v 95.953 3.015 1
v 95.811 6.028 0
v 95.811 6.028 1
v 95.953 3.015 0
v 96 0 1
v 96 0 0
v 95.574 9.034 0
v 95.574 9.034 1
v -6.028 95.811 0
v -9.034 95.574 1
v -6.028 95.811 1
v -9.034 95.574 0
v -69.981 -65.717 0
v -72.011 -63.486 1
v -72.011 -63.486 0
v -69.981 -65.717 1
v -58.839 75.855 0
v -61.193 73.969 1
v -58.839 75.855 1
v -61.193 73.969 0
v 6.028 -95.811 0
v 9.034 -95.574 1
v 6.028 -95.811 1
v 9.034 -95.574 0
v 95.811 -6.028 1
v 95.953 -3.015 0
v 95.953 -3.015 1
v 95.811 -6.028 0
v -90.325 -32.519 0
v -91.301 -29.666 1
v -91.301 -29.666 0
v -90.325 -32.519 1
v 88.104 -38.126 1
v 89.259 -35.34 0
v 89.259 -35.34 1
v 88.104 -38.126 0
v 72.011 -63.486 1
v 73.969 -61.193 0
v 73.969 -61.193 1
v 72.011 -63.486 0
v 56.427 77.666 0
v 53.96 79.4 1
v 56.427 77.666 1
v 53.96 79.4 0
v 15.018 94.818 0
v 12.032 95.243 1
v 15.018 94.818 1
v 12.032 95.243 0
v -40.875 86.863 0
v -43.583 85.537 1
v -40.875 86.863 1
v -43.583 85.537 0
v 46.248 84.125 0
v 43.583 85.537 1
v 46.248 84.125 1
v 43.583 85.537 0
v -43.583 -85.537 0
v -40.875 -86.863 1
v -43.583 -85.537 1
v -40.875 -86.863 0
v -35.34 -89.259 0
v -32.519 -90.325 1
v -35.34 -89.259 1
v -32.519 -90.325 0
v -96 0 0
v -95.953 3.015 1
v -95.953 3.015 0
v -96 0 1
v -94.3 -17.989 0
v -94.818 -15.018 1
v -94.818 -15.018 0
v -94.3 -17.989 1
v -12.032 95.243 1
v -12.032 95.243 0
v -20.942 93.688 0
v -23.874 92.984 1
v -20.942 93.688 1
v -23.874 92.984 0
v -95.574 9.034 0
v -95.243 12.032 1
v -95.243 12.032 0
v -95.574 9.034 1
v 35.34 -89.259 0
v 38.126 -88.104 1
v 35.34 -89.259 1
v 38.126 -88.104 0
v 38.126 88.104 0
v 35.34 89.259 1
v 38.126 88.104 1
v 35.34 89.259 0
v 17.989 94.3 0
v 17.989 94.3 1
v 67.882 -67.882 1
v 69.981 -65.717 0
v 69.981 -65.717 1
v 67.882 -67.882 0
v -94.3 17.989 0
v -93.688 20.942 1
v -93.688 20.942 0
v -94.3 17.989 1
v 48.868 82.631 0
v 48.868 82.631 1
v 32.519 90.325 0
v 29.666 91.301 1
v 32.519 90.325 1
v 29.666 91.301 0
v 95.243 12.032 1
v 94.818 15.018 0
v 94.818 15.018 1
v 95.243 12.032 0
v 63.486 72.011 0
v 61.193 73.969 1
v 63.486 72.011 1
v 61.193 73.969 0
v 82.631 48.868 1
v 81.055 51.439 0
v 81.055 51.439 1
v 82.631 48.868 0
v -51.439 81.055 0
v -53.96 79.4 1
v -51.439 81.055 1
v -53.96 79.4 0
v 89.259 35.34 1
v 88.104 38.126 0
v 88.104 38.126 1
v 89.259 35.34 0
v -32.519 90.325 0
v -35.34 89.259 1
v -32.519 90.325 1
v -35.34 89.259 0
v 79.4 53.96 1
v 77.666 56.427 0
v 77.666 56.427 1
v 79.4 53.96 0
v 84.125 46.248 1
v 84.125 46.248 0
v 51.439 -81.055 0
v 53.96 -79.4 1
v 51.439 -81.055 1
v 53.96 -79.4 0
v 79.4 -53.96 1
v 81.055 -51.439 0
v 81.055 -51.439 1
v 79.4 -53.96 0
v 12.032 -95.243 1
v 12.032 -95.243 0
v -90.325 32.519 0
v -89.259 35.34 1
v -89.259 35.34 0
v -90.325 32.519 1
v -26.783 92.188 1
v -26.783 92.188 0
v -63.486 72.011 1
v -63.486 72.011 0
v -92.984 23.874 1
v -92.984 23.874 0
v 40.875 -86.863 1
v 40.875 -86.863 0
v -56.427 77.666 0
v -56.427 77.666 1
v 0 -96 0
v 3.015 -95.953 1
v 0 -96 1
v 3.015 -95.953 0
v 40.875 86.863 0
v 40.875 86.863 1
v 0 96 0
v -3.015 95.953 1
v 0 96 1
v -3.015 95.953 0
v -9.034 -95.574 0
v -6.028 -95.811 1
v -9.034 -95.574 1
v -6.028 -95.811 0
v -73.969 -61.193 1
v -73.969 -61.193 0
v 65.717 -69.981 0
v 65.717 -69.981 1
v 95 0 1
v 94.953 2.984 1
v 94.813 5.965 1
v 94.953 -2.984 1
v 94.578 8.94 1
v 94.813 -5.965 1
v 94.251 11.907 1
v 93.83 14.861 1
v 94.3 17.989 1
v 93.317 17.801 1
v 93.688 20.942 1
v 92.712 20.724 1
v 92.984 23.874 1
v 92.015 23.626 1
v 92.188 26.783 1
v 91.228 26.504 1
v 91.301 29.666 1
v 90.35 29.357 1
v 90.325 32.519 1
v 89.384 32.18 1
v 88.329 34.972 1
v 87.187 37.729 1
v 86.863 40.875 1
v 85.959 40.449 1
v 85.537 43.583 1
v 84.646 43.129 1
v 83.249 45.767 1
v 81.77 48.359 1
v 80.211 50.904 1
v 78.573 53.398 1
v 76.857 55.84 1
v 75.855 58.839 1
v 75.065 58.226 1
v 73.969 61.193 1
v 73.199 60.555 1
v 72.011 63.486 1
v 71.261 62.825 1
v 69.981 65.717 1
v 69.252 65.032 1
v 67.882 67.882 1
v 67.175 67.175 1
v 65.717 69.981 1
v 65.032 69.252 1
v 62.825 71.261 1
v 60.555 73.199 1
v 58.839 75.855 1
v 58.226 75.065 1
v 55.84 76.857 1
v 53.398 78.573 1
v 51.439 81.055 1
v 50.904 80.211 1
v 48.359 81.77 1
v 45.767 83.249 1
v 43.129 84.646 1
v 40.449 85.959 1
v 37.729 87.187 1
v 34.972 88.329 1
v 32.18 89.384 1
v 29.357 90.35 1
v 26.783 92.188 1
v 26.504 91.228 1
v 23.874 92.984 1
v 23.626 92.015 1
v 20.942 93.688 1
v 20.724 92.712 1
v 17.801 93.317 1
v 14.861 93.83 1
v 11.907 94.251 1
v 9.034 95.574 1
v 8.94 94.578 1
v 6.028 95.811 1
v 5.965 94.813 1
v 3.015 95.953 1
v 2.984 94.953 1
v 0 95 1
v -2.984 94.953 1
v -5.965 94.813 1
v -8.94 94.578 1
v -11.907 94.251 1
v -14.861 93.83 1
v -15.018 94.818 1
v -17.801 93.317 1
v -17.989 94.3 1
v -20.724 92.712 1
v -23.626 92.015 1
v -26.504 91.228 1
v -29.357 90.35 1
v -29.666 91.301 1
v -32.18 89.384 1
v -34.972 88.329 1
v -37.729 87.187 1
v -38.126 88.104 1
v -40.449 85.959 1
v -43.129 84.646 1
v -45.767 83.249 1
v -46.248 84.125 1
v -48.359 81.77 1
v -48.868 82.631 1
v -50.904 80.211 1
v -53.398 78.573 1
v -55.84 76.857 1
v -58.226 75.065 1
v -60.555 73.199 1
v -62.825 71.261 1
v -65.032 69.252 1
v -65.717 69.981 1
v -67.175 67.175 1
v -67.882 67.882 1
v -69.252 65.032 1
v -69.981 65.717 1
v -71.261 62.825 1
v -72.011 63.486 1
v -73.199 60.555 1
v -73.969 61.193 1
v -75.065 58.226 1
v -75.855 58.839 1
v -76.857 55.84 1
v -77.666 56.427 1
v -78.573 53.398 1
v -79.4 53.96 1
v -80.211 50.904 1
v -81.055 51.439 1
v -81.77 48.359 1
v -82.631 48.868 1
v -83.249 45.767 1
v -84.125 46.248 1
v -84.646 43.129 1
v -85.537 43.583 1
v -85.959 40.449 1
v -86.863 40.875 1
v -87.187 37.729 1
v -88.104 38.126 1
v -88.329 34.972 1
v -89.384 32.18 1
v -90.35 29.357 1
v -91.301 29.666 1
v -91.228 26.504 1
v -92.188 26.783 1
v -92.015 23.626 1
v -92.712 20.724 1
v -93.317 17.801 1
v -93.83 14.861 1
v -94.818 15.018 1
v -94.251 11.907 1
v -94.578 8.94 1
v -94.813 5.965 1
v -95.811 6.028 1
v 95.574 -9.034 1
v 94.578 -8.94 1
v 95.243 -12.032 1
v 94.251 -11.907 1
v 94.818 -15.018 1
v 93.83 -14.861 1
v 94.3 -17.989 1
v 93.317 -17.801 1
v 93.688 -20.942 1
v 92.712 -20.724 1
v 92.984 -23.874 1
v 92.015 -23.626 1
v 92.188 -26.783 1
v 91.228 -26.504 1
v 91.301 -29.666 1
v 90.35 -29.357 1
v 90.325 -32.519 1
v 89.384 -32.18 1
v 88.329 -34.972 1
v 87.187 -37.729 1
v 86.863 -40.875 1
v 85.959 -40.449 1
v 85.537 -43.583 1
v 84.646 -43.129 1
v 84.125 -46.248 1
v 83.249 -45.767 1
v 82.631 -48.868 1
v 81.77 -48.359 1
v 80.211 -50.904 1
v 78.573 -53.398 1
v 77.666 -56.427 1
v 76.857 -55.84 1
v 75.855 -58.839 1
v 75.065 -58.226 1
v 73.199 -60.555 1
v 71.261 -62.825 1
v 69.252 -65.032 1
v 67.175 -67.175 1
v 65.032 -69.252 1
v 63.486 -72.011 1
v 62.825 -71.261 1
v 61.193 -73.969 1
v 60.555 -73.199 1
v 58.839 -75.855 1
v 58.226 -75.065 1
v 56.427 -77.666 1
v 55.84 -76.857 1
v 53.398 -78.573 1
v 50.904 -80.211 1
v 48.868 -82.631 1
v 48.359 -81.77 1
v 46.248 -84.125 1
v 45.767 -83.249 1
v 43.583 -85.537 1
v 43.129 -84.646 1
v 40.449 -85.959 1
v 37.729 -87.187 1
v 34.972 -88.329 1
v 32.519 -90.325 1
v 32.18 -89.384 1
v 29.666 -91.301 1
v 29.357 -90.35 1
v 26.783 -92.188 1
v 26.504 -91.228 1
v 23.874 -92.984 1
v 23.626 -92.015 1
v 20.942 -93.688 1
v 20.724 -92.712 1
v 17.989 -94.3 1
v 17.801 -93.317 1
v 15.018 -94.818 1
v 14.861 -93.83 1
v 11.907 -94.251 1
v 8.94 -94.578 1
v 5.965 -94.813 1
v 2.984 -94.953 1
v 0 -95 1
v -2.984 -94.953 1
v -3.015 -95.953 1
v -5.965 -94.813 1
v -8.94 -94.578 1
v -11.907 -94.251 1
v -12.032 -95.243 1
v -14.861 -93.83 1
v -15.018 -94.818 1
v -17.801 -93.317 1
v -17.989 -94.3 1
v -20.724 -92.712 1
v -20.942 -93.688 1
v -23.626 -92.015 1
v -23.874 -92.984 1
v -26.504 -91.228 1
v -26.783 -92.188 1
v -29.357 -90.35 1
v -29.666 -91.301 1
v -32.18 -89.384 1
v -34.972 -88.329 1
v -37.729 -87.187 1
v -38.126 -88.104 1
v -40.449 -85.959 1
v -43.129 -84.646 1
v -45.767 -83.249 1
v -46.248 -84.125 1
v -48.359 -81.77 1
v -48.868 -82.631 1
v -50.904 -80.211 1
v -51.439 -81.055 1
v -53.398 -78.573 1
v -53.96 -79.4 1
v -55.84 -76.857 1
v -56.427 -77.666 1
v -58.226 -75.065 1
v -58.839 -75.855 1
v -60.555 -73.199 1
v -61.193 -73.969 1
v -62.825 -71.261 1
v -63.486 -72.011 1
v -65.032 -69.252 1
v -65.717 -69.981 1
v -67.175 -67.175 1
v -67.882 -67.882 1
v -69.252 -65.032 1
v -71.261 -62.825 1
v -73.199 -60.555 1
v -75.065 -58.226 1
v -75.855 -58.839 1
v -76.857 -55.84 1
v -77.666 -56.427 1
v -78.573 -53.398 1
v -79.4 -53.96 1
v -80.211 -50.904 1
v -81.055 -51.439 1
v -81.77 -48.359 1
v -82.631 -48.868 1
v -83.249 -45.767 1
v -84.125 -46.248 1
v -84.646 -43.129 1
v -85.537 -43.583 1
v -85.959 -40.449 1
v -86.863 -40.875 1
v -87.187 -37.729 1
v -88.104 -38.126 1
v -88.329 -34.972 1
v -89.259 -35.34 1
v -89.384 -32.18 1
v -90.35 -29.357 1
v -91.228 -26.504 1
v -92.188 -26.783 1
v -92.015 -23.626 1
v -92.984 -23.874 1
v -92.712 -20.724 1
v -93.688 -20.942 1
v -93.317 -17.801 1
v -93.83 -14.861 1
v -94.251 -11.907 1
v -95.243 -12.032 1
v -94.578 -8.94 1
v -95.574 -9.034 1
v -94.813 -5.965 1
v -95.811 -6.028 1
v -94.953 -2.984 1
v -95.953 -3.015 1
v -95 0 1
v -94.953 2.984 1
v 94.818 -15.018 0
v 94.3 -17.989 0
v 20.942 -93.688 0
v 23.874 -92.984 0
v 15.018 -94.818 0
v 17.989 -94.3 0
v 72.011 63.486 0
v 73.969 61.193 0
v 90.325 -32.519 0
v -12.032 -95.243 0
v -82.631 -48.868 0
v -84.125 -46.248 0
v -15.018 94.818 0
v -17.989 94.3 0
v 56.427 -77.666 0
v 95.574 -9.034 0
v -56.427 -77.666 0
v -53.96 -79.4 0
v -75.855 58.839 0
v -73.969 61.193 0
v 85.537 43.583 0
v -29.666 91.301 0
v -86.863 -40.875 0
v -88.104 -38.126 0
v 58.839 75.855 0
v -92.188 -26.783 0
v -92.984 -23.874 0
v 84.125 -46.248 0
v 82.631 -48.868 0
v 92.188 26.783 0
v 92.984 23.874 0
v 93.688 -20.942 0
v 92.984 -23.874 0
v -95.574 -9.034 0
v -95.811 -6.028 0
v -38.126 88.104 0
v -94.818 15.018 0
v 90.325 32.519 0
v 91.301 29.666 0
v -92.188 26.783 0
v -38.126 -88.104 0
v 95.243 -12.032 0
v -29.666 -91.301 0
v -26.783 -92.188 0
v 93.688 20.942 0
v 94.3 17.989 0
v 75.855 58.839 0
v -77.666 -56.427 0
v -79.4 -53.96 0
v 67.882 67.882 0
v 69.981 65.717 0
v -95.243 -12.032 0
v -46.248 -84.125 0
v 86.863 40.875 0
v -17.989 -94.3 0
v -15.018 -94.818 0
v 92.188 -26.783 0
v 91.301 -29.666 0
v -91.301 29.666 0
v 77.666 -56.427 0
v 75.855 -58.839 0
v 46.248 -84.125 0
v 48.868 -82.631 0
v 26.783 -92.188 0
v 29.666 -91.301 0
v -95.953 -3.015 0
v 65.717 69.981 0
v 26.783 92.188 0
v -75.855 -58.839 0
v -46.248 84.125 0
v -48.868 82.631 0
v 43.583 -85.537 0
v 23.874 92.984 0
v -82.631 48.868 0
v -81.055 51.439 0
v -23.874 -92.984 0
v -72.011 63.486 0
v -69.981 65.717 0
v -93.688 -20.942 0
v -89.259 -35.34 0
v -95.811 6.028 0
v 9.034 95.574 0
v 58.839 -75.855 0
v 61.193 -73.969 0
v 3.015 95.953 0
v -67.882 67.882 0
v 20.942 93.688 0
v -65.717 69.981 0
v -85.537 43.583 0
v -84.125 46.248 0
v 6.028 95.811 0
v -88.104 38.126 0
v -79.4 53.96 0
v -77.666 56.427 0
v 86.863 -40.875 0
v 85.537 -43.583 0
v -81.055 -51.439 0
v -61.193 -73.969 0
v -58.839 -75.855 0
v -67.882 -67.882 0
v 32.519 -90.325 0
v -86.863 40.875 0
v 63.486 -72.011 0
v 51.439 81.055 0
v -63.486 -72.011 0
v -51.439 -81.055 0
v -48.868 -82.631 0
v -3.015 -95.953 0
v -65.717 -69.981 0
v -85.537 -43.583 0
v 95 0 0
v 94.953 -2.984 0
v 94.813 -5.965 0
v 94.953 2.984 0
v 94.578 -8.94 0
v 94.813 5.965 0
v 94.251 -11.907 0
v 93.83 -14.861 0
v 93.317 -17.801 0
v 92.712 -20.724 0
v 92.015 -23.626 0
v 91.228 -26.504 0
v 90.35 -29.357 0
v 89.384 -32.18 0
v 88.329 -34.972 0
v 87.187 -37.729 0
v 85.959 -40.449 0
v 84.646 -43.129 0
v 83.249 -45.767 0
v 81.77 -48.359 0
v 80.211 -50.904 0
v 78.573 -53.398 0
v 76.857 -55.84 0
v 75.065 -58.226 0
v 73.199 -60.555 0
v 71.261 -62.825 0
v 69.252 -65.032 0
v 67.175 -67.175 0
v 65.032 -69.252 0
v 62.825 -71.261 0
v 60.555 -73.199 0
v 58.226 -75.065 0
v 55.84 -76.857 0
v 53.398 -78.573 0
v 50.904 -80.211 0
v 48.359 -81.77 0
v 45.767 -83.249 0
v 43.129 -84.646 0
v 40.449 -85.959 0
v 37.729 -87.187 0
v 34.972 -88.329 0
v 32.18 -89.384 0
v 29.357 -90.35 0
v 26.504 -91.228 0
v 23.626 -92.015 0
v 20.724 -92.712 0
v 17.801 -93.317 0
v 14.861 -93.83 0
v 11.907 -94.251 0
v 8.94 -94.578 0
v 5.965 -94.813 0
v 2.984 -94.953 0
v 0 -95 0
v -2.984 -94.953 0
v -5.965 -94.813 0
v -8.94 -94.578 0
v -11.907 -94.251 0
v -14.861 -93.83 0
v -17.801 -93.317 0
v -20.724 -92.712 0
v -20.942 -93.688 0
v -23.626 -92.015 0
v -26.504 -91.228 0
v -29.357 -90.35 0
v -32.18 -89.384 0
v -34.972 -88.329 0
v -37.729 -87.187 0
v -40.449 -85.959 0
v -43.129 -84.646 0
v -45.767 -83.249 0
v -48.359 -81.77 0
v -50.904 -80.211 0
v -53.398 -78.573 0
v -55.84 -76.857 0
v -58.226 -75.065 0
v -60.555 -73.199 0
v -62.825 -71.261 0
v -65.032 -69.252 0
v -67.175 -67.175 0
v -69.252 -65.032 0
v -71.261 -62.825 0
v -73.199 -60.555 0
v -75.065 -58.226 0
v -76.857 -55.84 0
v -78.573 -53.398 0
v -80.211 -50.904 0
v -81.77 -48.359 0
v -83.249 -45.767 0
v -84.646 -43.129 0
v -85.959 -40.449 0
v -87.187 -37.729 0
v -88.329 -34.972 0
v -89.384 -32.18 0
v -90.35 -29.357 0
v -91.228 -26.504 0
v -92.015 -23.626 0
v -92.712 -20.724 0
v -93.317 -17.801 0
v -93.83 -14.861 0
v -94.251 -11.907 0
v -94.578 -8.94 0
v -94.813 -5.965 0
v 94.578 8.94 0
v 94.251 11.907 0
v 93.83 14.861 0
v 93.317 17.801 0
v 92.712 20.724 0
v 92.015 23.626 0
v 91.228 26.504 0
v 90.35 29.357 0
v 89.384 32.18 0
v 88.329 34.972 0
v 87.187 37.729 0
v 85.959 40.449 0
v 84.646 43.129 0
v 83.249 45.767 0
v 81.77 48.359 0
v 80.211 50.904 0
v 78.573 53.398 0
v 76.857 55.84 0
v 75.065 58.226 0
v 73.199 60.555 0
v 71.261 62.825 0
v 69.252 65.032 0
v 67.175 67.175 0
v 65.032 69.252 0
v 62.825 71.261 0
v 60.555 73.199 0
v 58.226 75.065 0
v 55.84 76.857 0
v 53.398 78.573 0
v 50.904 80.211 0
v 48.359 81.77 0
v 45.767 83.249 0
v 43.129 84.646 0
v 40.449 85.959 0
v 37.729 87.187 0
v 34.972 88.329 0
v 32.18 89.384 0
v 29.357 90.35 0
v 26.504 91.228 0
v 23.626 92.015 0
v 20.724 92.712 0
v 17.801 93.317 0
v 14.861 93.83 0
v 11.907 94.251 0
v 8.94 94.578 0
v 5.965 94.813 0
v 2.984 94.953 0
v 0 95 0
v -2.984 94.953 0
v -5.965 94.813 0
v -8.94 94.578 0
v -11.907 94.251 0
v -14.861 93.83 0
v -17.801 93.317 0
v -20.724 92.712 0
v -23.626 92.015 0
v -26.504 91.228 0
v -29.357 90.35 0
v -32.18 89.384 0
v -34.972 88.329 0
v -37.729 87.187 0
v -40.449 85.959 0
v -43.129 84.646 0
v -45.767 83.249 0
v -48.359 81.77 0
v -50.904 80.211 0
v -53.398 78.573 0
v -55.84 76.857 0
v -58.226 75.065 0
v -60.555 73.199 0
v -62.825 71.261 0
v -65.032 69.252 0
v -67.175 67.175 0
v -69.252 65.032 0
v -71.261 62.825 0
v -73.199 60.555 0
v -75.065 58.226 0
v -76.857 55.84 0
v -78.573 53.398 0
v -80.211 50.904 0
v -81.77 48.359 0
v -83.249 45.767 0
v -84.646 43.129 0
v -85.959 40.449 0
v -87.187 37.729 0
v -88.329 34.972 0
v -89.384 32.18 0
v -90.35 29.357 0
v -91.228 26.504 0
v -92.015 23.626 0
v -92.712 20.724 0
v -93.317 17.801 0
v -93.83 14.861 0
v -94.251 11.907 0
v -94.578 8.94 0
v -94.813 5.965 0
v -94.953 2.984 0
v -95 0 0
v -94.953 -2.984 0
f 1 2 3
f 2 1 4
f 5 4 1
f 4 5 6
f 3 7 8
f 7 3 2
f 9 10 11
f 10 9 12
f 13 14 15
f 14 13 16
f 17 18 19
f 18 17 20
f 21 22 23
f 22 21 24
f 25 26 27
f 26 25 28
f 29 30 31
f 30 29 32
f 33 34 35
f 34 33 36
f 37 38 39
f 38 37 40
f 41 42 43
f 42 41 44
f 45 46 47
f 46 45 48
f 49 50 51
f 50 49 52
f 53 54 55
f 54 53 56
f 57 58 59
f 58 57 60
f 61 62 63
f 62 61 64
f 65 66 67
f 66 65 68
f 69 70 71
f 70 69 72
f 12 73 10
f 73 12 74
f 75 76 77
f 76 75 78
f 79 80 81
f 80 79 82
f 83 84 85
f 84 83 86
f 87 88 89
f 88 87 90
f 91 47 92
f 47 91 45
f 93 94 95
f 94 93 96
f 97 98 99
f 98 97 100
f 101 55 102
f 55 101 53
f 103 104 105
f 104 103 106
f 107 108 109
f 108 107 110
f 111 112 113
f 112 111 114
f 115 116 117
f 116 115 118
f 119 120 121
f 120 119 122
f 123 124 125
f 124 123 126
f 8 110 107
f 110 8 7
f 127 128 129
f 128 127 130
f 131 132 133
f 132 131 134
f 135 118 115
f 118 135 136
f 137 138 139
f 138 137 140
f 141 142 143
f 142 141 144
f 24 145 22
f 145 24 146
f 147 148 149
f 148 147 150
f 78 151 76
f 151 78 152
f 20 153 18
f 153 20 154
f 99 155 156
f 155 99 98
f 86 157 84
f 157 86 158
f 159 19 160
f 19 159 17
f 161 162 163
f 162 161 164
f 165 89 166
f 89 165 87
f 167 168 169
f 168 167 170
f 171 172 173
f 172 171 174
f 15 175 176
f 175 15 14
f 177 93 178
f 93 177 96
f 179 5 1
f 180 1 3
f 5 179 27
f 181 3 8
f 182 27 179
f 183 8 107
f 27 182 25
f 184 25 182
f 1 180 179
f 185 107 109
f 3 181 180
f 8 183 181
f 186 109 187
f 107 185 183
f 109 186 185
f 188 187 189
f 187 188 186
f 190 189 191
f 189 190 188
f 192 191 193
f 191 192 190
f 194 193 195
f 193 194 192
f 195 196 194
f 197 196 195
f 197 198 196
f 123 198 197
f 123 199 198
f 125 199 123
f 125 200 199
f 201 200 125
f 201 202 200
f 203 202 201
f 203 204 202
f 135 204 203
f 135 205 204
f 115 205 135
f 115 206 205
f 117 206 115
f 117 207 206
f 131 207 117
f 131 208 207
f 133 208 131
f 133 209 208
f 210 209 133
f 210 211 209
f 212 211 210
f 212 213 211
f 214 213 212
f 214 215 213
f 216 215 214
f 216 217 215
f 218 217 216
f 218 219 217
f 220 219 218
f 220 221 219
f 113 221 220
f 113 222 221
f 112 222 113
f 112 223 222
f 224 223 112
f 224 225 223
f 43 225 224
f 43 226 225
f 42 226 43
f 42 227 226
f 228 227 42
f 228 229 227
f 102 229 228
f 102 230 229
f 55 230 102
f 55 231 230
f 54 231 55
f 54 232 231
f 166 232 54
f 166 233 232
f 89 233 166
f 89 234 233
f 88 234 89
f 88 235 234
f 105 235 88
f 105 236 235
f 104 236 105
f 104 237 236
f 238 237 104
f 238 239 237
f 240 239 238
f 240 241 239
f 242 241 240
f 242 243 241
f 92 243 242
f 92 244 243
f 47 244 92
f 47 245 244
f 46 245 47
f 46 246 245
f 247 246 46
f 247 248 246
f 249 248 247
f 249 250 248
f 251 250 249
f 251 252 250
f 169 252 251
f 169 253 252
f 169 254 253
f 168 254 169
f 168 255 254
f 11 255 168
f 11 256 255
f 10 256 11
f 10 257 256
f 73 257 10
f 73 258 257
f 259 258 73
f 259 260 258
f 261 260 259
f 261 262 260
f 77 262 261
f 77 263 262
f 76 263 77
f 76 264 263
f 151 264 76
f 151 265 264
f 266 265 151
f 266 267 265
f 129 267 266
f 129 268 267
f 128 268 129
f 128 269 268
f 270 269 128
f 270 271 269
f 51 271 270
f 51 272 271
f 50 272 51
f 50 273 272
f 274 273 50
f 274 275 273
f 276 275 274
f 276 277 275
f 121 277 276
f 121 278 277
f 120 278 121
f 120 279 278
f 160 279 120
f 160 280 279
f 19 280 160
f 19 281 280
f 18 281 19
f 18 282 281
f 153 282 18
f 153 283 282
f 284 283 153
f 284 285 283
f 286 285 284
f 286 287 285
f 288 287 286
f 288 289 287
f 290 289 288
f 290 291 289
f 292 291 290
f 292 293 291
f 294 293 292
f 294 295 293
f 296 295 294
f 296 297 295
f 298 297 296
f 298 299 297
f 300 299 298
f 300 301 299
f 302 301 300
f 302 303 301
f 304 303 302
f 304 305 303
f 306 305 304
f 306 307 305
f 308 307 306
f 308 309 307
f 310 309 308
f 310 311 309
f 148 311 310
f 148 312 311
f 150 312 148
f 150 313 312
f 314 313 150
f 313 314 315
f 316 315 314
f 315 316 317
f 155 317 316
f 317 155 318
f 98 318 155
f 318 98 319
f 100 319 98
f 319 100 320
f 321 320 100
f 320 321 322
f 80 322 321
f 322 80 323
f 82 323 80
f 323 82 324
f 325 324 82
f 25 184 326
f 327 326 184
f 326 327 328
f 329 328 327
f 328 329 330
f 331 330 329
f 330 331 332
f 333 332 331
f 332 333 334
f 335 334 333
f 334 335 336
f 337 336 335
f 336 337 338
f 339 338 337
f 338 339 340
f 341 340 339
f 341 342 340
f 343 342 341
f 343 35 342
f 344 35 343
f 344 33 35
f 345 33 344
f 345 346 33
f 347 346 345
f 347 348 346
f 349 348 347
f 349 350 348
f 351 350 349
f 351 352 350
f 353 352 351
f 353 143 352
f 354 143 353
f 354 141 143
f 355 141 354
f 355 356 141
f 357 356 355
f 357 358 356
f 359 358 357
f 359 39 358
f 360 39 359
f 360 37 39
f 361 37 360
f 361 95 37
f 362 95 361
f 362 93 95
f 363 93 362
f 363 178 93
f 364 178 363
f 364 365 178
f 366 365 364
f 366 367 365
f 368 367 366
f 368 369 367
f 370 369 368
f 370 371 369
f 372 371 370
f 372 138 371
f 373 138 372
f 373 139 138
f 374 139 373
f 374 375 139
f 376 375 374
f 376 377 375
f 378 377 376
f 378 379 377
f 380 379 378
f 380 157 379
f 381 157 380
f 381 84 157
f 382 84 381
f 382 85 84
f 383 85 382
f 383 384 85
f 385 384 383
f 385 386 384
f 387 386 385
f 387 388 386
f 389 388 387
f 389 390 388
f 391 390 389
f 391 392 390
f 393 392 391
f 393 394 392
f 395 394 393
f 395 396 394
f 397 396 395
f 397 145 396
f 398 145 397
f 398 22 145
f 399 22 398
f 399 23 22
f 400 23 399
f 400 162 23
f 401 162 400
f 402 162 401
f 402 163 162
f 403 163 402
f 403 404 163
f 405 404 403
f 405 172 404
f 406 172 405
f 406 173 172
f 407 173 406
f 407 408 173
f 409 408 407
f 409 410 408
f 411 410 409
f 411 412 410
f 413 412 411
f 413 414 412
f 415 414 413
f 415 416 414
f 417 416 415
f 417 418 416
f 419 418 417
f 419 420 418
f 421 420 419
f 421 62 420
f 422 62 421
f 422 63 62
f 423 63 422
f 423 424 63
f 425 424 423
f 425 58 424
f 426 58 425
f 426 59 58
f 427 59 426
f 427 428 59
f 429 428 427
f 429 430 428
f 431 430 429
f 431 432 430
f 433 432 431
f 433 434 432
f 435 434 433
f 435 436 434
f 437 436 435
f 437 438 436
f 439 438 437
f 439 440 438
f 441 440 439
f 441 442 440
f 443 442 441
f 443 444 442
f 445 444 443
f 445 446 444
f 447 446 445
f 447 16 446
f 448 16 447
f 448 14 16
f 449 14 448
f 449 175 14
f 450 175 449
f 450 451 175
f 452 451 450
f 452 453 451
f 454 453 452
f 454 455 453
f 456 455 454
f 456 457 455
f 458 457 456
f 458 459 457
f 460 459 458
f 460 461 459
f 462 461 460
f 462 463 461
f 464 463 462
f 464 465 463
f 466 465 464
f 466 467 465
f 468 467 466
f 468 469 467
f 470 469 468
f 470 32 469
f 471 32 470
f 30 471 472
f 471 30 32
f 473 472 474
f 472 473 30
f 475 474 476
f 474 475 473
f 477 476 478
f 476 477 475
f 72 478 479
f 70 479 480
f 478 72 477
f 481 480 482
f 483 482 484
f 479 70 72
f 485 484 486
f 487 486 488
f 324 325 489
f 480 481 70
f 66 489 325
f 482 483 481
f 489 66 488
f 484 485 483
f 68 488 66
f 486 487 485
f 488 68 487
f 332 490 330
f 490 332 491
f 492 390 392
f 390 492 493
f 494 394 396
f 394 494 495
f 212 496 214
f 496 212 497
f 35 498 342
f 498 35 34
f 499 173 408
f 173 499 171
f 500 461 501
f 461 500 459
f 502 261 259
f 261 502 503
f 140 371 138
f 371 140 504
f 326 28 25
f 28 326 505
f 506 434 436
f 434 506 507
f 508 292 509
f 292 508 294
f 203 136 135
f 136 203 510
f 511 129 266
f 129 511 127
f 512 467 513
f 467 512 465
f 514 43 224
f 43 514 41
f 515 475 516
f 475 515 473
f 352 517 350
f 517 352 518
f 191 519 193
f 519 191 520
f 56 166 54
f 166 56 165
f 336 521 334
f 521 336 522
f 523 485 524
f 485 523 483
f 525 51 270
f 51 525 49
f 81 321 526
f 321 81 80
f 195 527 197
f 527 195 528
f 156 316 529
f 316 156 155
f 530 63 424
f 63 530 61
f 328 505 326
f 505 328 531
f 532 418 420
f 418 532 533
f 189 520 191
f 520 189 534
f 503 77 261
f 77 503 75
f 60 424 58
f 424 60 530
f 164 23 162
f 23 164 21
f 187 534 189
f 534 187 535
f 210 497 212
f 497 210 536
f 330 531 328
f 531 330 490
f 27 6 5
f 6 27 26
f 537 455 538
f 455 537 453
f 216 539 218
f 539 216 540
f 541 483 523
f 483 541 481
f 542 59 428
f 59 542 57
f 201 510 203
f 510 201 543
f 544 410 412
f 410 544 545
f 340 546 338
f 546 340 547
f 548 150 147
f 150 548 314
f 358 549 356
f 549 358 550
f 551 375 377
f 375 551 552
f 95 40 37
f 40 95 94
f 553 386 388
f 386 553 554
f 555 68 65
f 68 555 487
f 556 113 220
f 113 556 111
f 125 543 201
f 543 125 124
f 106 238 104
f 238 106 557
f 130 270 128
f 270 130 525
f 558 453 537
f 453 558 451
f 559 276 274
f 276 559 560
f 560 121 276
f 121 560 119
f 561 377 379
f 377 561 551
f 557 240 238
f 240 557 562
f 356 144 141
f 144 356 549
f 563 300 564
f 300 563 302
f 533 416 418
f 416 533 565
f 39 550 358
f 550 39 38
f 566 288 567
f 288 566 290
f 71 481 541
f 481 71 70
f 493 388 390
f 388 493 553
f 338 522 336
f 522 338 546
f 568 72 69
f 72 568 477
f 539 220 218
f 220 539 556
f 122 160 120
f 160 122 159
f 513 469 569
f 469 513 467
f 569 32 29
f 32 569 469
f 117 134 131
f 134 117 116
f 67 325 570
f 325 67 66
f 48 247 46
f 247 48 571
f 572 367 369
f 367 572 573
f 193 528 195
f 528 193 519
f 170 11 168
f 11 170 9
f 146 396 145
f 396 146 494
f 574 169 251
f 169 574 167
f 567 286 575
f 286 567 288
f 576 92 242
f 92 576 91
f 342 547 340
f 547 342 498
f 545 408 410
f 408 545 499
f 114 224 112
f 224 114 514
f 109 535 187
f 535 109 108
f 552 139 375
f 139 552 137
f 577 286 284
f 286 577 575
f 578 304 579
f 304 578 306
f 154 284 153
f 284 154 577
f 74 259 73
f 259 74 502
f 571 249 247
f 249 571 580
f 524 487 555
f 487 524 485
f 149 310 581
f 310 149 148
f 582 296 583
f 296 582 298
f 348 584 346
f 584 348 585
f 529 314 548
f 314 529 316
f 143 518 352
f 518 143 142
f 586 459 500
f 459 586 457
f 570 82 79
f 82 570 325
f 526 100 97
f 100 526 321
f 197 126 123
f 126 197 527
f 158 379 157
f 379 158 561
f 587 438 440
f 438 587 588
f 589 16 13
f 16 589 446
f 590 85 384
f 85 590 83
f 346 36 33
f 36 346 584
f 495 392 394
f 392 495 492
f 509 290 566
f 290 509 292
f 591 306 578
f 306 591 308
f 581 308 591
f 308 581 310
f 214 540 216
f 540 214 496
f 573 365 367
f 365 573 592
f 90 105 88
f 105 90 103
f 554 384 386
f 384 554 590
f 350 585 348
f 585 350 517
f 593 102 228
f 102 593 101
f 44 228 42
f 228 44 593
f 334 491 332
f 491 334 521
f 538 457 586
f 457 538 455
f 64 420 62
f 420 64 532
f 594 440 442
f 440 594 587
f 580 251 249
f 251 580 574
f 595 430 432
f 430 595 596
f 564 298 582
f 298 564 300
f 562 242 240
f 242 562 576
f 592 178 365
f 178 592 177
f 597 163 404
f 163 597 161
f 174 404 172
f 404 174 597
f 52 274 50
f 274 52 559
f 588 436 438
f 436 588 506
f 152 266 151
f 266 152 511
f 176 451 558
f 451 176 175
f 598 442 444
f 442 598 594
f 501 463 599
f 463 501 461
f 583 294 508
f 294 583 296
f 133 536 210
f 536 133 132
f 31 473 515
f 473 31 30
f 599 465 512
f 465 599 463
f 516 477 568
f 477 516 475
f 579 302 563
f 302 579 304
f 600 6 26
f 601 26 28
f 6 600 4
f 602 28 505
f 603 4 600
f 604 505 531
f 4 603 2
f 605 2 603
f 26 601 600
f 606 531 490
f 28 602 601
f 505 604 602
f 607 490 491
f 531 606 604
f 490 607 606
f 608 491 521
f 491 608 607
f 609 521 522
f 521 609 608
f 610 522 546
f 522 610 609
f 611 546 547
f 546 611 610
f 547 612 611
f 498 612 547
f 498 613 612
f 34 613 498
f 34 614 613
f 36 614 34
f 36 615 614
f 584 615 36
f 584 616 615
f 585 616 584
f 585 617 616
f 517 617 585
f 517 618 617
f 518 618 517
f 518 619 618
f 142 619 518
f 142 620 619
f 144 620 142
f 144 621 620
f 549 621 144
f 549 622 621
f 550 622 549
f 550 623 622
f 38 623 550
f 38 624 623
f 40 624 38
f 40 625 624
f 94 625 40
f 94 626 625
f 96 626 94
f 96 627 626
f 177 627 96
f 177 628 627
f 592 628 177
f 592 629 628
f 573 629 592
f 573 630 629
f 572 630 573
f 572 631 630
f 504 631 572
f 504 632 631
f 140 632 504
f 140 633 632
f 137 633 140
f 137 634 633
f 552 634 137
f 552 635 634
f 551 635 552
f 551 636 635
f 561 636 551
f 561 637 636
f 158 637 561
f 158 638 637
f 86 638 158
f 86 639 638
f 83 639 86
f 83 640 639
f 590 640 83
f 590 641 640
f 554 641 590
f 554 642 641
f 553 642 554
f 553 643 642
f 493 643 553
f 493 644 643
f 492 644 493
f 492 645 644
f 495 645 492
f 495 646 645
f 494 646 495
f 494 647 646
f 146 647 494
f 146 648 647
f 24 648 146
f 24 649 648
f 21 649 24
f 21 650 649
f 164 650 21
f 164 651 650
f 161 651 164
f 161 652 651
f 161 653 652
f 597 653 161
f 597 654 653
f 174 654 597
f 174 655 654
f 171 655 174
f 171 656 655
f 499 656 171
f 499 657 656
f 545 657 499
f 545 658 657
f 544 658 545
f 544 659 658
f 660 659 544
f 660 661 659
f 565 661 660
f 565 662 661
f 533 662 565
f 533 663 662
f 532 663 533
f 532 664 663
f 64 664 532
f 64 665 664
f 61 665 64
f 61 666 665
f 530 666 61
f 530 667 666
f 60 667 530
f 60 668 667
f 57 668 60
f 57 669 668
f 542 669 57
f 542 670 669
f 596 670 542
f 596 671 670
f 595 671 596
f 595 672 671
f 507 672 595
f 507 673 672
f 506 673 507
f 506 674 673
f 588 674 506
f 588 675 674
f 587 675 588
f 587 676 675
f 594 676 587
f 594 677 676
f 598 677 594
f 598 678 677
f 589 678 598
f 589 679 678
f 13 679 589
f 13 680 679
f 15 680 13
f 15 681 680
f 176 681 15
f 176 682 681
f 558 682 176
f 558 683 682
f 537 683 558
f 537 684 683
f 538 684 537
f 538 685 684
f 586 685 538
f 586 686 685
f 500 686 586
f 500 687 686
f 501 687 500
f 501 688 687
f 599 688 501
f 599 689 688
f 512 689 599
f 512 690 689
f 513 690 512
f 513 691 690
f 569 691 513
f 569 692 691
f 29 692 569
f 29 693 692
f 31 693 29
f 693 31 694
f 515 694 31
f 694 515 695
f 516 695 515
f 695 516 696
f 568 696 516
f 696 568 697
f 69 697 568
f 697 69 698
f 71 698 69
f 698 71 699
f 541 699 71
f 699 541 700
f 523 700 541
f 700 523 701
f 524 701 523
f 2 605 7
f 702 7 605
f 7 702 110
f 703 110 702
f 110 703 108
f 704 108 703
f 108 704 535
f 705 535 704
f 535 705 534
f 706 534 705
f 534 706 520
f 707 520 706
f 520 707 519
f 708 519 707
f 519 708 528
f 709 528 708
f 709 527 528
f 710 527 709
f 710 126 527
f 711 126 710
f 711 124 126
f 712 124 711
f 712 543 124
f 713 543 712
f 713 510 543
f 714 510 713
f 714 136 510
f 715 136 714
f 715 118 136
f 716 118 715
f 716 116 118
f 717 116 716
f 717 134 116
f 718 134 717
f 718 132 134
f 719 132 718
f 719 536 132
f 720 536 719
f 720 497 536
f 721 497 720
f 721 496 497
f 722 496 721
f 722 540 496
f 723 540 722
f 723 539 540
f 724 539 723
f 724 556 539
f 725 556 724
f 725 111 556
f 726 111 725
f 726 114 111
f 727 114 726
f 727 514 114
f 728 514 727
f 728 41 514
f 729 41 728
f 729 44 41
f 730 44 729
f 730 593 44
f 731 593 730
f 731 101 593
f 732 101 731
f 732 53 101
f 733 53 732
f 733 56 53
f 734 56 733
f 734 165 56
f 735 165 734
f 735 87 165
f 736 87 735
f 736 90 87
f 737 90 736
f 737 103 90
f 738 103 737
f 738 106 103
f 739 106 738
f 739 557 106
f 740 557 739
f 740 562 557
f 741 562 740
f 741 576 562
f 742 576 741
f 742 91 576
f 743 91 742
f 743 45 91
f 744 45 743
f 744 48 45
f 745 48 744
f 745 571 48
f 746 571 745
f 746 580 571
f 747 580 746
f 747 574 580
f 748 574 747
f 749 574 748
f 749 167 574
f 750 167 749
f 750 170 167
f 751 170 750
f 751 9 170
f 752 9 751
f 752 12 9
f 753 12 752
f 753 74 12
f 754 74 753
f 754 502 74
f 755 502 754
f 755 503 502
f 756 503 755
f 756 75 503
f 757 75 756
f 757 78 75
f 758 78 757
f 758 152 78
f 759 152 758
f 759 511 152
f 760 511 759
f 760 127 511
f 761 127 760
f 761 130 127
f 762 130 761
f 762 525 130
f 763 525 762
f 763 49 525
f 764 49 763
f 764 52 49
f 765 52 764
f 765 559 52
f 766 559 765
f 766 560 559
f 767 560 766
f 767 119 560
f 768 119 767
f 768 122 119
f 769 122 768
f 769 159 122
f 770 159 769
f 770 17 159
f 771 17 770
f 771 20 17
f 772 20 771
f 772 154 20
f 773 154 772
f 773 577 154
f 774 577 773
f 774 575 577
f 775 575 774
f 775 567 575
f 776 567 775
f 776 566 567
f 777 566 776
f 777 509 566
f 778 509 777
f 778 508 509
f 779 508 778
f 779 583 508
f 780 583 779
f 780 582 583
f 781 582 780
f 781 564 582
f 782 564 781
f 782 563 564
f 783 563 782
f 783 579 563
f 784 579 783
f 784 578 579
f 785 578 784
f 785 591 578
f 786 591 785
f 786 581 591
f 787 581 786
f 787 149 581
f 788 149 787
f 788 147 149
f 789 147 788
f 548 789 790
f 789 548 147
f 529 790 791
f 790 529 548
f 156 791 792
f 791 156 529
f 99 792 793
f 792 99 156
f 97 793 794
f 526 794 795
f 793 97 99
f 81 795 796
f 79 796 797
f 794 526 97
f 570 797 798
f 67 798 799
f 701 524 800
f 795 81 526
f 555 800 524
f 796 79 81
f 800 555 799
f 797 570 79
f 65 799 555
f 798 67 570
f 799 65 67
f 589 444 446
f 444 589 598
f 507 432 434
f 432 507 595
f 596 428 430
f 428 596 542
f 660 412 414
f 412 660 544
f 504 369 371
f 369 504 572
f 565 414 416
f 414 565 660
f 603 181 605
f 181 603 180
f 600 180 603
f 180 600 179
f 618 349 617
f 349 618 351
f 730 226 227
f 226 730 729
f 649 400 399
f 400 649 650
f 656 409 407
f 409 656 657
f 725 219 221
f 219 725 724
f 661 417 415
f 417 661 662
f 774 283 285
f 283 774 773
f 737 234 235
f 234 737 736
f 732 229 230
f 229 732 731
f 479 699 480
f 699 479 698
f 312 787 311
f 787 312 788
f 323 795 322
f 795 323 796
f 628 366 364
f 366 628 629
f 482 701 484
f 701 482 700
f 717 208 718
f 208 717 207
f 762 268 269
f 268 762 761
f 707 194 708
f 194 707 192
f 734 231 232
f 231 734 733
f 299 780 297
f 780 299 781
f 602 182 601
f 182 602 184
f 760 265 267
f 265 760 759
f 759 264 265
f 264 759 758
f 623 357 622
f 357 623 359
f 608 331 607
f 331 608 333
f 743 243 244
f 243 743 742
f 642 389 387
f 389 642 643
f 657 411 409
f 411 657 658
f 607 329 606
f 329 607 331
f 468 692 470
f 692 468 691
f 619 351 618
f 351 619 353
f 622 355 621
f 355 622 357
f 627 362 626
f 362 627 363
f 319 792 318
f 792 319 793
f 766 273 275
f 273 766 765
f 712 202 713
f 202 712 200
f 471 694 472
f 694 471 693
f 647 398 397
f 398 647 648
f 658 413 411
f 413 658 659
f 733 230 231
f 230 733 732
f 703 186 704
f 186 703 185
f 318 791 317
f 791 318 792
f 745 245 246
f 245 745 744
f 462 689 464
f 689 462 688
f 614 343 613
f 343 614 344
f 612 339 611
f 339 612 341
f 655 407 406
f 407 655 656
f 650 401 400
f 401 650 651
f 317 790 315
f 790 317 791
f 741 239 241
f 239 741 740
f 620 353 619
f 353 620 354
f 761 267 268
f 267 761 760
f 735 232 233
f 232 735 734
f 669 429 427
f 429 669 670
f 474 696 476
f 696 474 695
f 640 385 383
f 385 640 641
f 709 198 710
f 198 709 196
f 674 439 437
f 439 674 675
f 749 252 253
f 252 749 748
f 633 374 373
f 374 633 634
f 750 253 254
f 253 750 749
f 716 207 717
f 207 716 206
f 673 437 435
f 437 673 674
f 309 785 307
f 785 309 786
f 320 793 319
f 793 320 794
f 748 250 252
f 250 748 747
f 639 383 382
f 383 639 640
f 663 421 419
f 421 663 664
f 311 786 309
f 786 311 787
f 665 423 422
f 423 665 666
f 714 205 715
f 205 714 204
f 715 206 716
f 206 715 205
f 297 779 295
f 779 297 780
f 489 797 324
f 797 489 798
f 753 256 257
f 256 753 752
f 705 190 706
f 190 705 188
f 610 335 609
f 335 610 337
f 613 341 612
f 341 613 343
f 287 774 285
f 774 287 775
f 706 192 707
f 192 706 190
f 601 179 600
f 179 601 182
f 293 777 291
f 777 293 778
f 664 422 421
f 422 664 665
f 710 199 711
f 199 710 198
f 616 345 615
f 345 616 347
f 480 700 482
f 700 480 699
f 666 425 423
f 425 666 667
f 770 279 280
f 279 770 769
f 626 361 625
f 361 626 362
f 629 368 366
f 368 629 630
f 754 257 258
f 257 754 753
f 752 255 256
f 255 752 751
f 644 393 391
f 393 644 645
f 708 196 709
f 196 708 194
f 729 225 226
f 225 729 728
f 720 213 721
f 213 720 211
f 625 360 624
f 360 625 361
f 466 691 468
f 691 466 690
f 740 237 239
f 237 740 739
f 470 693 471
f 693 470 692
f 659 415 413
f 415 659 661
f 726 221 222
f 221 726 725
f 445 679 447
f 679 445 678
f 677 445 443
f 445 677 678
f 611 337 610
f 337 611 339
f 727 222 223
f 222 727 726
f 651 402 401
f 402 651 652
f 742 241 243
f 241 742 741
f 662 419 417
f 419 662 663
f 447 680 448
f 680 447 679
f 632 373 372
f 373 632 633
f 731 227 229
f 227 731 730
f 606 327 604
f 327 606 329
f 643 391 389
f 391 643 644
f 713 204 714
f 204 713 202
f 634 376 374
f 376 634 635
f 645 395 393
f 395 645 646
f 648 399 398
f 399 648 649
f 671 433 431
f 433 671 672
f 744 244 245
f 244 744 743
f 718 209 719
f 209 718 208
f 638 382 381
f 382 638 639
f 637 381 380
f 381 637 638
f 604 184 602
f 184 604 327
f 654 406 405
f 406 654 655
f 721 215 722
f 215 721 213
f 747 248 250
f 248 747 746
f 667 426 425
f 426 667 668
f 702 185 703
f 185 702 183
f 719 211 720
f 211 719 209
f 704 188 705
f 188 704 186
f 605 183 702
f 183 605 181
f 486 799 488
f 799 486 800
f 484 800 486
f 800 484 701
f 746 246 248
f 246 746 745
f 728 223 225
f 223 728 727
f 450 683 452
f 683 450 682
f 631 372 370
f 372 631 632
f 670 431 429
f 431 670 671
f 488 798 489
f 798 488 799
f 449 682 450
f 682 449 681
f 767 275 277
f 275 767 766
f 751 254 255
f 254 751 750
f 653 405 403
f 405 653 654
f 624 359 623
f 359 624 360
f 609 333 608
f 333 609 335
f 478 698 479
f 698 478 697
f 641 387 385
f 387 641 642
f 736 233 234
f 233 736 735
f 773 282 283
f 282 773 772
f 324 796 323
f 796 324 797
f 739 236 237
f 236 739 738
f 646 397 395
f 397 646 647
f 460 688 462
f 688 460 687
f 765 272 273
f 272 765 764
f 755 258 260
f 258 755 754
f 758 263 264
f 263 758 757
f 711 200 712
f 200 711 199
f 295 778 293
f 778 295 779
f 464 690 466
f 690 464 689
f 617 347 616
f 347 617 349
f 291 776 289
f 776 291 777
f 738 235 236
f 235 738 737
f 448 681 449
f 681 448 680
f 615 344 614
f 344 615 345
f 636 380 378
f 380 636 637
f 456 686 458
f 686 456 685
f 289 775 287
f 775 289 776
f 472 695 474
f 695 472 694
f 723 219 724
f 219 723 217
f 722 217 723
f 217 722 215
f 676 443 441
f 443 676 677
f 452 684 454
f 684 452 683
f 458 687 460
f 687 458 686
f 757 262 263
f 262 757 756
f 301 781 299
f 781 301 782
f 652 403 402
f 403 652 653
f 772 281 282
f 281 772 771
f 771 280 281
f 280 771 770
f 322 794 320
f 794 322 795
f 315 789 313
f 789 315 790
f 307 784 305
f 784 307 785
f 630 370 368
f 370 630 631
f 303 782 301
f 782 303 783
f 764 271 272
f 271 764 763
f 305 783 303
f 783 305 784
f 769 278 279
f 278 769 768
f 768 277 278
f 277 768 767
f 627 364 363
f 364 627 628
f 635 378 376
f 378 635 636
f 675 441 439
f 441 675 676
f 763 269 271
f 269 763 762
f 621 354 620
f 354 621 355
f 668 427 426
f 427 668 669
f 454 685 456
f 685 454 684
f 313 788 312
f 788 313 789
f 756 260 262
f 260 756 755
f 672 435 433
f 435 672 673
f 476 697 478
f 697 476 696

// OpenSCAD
// /********************************************************           
//  * Variable cicle for collision calibration             *   
//  *                                                      *   
//  * Author:  Adam, Kuczmik                               *   
//  *                                                      *   
//  * Purpose: For collision calibration of a delta 3d     *
//  * Printer (1 mm height)                                *   
//  *                                                      *   
//  * Usage:                                               *   
//  *      Run it in OpenSCAD version 2015.03-2            *   
//  ********************************************************/  
//
//
//
// Radius of the Ring [mm]
Radius= 96; 
 
 difference() {
    cylinder(h=1, r=Radius, center=false, $fn=200);
    cylinder(h=1, r=Radius-1, center=false, $fn=200);  
 }

 
